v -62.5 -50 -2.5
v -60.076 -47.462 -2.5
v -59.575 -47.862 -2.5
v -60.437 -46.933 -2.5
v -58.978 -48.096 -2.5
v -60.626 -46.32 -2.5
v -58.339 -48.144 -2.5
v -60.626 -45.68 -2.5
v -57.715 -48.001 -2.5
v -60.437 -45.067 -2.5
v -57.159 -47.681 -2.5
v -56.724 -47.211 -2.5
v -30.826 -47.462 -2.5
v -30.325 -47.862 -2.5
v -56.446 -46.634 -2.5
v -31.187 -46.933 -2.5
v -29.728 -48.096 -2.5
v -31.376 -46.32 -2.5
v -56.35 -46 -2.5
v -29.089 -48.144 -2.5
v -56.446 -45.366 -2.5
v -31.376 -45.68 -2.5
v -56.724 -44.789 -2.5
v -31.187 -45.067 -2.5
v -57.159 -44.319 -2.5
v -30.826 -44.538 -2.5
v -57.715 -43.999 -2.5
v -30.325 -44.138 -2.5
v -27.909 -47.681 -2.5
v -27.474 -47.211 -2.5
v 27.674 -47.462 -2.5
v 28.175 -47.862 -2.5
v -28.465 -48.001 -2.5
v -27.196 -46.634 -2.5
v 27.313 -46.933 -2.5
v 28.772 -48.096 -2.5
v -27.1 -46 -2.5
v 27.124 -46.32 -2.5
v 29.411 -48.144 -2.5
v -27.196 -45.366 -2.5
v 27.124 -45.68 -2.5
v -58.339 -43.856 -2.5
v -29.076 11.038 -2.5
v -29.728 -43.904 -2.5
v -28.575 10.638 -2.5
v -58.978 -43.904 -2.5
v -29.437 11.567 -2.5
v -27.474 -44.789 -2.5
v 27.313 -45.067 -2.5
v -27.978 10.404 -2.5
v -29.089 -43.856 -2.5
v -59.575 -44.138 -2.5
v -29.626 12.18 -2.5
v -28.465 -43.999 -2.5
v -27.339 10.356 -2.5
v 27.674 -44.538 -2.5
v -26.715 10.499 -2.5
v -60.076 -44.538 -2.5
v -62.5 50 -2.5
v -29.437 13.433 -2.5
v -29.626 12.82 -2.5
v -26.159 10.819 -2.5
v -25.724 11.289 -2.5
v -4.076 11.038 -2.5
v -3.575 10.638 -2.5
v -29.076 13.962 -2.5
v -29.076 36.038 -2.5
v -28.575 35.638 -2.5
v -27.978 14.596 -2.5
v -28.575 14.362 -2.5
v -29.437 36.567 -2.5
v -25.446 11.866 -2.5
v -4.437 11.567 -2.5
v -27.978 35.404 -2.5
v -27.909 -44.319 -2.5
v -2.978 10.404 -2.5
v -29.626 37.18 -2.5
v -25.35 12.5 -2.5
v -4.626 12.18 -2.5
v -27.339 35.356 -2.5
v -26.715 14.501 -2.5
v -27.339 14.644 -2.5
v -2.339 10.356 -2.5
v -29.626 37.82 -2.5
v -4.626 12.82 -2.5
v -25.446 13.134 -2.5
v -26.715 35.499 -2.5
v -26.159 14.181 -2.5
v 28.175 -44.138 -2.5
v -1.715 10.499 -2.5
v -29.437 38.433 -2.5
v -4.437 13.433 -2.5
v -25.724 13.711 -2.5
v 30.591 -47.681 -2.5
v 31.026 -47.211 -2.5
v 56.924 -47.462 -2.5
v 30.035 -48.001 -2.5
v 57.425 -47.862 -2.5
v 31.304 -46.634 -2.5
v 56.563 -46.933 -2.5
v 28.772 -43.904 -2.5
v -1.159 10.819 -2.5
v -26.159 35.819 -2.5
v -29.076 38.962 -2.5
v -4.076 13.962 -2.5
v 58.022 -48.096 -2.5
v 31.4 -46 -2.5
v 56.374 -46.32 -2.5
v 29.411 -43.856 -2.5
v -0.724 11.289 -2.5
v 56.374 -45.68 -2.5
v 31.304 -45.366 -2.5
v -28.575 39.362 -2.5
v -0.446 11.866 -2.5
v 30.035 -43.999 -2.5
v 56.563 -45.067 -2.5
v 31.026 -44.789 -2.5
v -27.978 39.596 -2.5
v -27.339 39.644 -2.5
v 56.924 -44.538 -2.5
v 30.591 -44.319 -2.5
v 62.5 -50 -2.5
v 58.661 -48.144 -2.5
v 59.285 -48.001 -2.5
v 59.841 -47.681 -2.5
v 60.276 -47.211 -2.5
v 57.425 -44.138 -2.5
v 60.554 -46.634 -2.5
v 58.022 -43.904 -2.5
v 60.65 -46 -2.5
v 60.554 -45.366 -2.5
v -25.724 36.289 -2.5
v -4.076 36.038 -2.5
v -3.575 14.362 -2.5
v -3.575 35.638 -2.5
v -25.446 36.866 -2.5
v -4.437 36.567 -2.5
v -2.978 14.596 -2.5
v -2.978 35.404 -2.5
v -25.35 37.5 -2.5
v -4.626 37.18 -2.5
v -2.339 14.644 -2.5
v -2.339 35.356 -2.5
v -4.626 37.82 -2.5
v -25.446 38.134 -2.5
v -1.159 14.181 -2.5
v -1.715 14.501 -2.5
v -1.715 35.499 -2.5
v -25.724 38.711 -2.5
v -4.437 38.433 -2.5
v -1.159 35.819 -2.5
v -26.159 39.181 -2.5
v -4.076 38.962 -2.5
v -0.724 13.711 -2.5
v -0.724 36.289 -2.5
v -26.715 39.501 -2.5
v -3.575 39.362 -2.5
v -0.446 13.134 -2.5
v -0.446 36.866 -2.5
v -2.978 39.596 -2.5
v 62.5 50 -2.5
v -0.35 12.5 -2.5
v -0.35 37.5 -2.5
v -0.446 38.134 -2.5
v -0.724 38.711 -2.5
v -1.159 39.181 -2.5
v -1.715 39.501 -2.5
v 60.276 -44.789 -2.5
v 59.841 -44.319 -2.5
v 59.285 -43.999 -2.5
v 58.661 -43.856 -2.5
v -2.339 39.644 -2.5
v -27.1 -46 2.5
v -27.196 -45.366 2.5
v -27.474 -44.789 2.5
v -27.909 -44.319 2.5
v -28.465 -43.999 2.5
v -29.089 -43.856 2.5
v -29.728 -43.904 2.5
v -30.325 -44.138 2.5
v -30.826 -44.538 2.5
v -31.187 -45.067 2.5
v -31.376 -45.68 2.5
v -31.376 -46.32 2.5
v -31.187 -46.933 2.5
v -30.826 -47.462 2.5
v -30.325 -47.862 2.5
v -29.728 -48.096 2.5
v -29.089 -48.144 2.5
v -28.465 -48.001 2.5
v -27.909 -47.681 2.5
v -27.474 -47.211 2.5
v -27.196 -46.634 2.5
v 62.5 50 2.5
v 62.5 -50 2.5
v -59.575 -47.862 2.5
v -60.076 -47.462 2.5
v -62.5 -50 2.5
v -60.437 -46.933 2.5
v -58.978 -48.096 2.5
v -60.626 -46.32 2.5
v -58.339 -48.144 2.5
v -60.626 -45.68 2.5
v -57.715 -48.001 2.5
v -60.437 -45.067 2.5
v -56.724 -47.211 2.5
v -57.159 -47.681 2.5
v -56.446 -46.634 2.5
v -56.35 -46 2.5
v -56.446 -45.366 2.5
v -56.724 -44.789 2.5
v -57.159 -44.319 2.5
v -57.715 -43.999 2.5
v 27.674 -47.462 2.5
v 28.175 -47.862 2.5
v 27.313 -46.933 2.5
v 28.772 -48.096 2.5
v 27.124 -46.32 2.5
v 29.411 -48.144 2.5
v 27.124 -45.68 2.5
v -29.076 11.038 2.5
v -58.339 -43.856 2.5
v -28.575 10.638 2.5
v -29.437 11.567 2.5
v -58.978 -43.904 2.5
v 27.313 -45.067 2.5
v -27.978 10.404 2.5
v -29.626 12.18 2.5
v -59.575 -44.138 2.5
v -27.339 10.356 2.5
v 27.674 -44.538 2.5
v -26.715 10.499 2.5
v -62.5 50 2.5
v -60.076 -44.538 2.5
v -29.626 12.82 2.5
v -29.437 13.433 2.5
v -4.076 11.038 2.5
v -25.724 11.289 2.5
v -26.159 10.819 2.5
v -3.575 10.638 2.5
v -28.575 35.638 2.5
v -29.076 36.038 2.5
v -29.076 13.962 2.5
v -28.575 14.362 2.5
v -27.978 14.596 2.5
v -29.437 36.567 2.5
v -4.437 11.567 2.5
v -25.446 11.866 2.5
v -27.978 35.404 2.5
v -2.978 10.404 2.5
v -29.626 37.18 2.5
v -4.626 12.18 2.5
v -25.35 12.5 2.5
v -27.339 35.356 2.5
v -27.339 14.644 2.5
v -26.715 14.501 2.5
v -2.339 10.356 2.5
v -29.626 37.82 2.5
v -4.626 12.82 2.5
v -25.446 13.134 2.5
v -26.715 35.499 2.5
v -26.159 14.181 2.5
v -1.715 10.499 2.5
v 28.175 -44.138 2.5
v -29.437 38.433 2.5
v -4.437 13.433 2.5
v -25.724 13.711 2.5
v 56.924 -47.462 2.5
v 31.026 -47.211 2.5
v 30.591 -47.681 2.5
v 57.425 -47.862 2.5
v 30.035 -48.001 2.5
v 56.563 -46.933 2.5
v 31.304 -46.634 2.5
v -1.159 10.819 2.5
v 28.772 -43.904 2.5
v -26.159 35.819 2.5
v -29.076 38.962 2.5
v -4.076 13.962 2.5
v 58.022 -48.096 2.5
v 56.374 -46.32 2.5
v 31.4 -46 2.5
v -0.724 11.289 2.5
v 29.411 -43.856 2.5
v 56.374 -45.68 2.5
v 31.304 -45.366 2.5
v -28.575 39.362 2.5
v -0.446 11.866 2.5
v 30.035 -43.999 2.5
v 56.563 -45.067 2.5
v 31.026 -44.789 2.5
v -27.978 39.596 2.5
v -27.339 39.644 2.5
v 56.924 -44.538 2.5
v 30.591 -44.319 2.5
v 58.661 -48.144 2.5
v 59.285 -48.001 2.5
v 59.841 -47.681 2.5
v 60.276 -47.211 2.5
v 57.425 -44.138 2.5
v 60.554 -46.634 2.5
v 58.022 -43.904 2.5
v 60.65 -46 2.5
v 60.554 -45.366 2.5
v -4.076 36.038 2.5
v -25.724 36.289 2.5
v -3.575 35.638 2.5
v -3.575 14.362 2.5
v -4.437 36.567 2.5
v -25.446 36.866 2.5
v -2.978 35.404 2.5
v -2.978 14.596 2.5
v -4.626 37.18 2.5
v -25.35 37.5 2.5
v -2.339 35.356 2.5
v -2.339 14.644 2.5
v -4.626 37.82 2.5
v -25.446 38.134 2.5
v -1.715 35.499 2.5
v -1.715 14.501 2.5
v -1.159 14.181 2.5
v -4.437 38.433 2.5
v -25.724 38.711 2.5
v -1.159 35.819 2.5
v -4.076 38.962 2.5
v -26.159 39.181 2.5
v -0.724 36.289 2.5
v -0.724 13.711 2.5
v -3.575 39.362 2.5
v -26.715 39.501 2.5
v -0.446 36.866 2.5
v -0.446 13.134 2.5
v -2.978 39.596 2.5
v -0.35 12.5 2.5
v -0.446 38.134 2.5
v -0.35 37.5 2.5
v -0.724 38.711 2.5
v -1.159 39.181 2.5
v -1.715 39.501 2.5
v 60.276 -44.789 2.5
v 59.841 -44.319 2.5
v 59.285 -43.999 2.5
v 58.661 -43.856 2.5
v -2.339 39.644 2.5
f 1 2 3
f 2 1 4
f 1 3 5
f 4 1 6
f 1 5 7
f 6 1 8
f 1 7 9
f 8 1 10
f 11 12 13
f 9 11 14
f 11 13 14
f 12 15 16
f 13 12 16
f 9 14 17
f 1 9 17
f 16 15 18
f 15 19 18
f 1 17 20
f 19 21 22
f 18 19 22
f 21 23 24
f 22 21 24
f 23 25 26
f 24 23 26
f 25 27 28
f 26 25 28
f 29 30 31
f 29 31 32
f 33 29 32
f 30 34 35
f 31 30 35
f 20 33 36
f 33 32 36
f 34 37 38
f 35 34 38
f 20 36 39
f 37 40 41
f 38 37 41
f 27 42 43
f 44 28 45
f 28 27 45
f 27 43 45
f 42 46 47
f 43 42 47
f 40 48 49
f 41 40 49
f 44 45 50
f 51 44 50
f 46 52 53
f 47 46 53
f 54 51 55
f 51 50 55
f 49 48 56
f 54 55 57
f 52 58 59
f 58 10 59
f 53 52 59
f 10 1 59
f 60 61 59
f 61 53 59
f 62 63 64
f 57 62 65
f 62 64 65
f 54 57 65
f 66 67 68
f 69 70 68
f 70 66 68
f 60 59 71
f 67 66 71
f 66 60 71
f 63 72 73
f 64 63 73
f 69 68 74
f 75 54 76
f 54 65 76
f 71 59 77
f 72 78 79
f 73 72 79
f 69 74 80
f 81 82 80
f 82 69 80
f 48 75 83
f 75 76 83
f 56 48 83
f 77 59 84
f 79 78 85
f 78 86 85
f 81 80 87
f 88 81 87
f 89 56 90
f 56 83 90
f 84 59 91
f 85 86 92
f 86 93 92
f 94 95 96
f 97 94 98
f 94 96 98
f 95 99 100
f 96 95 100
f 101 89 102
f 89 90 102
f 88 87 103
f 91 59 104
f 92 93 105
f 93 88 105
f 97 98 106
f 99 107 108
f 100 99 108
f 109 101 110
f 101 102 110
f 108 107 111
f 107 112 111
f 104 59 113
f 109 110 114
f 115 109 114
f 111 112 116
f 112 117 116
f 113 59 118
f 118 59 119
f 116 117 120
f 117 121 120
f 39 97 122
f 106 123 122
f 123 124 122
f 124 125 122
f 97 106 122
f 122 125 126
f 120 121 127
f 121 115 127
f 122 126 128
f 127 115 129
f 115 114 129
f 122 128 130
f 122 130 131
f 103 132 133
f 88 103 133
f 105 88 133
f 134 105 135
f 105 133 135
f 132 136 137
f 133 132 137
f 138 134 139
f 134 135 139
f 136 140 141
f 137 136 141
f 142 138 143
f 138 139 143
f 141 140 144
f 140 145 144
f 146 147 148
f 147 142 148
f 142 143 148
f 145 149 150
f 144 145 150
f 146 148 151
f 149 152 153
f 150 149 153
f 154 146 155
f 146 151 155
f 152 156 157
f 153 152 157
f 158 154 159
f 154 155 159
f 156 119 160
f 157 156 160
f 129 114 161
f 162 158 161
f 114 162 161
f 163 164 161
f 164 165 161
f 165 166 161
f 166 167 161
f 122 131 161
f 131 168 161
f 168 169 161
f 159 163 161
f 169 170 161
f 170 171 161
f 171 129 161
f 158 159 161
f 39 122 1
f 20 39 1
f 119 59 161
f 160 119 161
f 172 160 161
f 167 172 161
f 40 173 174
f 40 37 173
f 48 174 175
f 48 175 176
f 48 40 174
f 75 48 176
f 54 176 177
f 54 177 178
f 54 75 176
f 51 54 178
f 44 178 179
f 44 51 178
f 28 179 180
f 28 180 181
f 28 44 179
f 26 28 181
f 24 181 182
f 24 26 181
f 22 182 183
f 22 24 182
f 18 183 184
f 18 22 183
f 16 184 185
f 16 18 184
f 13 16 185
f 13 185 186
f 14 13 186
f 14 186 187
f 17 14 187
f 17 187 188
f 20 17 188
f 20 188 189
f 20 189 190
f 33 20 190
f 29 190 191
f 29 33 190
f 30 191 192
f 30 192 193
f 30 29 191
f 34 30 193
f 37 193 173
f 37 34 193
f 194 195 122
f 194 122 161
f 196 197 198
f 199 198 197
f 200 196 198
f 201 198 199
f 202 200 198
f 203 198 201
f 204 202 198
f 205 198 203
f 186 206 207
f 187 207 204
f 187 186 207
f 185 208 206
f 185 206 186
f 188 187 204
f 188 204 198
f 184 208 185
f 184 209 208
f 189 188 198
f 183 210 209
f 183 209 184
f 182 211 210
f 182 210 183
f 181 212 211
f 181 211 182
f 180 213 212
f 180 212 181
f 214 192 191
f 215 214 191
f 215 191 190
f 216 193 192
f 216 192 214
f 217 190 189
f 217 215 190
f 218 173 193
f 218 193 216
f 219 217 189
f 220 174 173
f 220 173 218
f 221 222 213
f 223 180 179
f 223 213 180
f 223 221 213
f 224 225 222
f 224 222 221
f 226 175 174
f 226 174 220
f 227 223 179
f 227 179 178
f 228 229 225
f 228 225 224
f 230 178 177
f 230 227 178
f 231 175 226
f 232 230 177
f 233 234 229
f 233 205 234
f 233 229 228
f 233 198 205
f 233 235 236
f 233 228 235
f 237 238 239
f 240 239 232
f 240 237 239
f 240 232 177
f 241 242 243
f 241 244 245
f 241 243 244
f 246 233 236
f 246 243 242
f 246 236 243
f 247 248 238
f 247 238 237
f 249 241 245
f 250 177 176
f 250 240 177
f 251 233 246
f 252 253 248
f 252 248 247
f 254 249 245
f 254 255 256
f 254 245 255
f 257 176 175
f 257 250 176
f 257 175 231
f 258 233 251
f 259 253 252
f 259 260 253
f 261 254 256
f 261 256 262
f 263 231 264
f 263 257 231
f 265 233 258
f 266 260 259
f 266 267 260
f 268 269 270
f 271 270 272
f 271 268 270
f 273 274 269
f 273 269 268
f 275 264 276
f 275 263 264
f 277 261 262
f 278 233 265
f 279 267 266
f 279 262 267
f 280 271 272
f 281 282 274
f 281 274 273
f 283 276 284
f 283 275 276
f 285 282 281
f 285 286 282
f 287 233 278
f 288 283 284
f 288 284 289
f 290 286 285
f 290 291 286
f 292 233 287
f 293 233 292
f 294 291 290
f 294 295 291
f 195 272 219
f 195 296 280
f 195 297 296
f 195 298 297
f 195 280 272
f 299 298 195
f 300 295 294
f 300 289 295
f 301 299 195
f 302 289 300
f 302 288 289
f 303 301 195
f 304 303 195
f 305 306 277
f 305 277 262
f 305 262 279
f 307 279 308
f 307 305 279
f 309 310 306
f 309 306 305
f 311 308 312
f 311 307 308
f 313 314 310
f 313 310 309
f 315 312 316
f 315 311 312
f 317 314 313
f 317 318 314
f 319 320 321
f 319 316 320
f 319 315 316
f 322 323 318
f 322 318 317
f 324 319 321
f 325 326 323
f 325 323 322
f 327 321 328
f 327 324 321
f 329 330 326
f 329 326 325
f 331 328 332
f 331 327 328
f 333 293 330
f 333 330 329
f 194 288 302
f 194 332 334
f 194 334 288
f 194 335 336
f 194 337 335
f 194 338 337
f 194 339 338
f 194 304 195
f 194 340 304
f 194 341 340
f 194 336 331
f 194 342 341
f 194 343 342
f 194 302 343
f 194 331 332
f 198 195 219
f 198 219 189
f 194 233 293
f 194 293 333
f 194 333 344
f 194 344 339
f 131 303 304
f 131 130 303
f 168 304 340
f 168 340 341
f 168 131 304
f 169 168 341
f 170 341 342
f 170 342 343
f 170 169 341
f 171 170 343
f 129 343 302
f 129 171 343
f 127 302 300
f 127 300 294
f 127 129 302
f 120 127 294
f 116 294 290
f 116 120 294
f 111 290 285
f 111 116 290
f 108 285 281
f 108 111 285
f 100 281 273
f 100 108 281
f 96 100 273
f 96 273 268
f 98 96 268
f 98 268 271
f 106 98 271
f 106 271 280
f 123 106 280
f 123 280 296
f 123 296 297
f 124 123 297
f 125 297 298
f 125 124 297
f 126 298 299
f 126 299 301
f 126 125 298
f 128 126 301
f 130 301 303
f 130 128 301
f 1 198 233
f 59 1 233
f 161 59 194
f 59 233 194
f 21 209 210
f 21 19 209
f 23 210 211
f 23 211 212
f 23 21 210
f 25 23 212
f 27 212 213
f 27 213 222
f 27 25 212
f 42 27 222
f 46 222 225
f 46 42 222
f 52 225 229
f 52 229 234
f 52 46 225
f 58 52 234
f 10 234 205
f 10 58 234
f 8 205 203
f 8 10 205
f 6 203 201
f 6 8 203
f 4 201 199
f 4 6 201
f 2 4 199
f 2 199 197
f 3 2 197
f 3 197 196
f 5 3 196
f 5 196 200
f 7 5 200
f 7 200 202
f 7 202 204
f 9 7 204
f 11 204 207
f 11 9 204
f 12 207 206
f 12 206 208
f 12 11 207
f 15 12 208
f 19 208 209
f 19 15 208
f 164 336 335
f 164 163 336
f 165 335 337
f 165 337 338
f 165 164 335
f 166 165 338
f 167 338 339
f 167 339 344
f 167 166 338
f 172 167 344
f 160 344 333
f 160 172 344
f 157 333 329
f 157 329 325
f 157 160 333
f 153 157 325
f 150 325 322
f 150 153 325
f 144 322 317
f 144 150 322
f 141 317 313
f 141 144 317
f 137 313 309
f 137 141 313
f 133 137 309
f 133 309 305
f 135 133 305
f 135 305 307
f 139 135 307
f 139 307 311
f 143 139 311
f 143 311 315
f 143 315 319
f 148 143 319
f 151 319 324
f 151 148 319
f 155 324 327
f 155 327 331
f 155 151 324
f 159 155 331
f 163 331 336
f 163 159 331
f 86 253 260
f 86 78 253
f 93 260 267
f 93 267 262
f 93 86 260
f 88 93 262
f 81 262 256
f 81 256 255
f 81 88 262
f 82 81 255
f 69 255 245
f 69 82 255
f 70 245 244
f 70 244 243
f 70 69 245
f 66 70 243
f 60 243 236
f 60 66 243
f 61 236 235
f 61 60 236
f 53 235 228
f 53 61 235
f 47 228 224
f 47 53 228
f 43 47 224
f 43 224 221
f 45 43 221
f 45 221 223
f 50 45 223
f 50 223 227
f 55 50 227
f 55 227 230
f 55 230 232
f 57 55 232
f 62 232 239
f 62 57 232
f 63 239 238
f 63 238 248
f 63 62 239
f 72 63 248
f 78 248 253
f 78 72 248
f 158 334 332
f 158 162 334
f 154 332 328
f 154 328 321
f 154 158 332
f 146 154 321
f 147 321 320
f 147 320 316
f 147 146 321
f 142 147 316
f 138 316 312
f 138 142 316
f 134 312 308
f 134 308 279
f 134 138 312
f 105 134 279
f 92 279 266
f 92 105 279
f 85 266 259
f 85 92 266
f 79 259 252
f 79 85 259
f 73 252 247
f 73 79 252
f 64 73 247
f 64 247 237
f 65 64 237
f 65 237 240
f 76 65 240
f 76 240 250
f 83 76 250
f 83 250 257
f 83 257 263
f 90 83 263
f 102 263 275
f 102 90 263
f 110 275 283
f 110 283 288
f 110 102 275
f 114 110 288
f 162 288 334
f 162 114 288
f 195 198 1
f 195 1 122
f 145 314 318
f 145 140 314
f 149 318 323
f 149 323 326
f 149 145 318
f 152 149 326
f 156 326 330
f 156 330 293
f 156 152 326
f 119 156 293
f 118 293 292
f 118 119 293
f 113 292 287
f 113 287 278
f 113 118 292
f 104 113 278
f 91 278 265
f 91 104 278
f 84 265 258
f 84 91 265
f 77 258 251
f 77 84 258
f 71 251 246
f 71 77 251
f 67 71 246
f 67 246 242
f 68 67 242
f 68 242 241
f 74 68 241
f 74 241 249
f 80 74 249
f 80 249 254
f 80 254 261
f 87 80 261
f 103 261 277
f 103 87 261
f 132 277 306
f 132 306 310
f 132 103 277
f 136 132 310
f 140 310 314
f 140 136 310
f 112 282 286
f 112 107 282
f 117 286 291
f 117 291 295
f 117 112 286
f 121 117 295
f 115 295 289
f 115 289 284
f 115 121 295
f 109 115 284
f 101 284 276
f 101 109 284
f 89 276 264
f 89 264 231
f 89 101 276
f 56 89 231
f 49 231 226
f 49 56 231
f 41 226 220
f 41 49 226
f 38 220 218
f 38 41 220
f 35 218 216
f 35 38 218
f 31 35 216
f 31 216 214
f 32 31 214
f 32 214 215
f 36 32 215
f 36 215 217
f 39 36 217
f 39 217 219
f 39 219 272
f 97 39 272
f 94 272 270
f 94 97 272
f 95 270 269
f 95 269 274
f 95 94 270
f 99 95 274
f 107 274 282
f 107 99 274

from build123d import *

# Parameters (mm, degrees)
SKETCH1_W           = 125
SKETCH1_H           = 100
SKETCH1_R           = 2.15
BOSS_EXTRUDE1_DEPTH = 2.5


with BuildPart() as part:
    # Sketch1 → Boss-Extrude1 (new, symmetric)
    with BuildSketch(Plane.XY):
        Rectangle(SKETCH1_W, SKETCH1_H)
        with Locations((-27.5, 37.5)):
            Circle(SKETCH1_R, mode=Mode.SUBTRACT)
        with Locations((-2.5, 37.5)):
            Circle(SKETCH1_R, mode=Mode.SUBTRACT)
        with Locations((-2.5, 12.5)):
            Circle(SKETCH1_R, mode=Mode.SUBTRACT)
        with Locations((-27.5, 12.5)):
            Circle(SKETCH1_R, mode=Mode.SUBTRACT)
        with Locations((-58.5, -46)):
            Circle(SKETCH1_R, mode=Mode.SUBTRACT)
        with Locations((58.5, -46)):
            Circle(SKETCH1_R, mode=Mode.SUBTRACT)
        with Locations((-29.25, -46)):
            Circle(SKETCH1_R, mode=Mode.SUBTRACT)
        with Locations((29.25, -46)):
            Circle(SKETCH1_R, mode=Mode.SUBTRACT)
    extrude(amount=BOSS_EXTRUDE1_DEPTH, both=True)


solid = part.part
